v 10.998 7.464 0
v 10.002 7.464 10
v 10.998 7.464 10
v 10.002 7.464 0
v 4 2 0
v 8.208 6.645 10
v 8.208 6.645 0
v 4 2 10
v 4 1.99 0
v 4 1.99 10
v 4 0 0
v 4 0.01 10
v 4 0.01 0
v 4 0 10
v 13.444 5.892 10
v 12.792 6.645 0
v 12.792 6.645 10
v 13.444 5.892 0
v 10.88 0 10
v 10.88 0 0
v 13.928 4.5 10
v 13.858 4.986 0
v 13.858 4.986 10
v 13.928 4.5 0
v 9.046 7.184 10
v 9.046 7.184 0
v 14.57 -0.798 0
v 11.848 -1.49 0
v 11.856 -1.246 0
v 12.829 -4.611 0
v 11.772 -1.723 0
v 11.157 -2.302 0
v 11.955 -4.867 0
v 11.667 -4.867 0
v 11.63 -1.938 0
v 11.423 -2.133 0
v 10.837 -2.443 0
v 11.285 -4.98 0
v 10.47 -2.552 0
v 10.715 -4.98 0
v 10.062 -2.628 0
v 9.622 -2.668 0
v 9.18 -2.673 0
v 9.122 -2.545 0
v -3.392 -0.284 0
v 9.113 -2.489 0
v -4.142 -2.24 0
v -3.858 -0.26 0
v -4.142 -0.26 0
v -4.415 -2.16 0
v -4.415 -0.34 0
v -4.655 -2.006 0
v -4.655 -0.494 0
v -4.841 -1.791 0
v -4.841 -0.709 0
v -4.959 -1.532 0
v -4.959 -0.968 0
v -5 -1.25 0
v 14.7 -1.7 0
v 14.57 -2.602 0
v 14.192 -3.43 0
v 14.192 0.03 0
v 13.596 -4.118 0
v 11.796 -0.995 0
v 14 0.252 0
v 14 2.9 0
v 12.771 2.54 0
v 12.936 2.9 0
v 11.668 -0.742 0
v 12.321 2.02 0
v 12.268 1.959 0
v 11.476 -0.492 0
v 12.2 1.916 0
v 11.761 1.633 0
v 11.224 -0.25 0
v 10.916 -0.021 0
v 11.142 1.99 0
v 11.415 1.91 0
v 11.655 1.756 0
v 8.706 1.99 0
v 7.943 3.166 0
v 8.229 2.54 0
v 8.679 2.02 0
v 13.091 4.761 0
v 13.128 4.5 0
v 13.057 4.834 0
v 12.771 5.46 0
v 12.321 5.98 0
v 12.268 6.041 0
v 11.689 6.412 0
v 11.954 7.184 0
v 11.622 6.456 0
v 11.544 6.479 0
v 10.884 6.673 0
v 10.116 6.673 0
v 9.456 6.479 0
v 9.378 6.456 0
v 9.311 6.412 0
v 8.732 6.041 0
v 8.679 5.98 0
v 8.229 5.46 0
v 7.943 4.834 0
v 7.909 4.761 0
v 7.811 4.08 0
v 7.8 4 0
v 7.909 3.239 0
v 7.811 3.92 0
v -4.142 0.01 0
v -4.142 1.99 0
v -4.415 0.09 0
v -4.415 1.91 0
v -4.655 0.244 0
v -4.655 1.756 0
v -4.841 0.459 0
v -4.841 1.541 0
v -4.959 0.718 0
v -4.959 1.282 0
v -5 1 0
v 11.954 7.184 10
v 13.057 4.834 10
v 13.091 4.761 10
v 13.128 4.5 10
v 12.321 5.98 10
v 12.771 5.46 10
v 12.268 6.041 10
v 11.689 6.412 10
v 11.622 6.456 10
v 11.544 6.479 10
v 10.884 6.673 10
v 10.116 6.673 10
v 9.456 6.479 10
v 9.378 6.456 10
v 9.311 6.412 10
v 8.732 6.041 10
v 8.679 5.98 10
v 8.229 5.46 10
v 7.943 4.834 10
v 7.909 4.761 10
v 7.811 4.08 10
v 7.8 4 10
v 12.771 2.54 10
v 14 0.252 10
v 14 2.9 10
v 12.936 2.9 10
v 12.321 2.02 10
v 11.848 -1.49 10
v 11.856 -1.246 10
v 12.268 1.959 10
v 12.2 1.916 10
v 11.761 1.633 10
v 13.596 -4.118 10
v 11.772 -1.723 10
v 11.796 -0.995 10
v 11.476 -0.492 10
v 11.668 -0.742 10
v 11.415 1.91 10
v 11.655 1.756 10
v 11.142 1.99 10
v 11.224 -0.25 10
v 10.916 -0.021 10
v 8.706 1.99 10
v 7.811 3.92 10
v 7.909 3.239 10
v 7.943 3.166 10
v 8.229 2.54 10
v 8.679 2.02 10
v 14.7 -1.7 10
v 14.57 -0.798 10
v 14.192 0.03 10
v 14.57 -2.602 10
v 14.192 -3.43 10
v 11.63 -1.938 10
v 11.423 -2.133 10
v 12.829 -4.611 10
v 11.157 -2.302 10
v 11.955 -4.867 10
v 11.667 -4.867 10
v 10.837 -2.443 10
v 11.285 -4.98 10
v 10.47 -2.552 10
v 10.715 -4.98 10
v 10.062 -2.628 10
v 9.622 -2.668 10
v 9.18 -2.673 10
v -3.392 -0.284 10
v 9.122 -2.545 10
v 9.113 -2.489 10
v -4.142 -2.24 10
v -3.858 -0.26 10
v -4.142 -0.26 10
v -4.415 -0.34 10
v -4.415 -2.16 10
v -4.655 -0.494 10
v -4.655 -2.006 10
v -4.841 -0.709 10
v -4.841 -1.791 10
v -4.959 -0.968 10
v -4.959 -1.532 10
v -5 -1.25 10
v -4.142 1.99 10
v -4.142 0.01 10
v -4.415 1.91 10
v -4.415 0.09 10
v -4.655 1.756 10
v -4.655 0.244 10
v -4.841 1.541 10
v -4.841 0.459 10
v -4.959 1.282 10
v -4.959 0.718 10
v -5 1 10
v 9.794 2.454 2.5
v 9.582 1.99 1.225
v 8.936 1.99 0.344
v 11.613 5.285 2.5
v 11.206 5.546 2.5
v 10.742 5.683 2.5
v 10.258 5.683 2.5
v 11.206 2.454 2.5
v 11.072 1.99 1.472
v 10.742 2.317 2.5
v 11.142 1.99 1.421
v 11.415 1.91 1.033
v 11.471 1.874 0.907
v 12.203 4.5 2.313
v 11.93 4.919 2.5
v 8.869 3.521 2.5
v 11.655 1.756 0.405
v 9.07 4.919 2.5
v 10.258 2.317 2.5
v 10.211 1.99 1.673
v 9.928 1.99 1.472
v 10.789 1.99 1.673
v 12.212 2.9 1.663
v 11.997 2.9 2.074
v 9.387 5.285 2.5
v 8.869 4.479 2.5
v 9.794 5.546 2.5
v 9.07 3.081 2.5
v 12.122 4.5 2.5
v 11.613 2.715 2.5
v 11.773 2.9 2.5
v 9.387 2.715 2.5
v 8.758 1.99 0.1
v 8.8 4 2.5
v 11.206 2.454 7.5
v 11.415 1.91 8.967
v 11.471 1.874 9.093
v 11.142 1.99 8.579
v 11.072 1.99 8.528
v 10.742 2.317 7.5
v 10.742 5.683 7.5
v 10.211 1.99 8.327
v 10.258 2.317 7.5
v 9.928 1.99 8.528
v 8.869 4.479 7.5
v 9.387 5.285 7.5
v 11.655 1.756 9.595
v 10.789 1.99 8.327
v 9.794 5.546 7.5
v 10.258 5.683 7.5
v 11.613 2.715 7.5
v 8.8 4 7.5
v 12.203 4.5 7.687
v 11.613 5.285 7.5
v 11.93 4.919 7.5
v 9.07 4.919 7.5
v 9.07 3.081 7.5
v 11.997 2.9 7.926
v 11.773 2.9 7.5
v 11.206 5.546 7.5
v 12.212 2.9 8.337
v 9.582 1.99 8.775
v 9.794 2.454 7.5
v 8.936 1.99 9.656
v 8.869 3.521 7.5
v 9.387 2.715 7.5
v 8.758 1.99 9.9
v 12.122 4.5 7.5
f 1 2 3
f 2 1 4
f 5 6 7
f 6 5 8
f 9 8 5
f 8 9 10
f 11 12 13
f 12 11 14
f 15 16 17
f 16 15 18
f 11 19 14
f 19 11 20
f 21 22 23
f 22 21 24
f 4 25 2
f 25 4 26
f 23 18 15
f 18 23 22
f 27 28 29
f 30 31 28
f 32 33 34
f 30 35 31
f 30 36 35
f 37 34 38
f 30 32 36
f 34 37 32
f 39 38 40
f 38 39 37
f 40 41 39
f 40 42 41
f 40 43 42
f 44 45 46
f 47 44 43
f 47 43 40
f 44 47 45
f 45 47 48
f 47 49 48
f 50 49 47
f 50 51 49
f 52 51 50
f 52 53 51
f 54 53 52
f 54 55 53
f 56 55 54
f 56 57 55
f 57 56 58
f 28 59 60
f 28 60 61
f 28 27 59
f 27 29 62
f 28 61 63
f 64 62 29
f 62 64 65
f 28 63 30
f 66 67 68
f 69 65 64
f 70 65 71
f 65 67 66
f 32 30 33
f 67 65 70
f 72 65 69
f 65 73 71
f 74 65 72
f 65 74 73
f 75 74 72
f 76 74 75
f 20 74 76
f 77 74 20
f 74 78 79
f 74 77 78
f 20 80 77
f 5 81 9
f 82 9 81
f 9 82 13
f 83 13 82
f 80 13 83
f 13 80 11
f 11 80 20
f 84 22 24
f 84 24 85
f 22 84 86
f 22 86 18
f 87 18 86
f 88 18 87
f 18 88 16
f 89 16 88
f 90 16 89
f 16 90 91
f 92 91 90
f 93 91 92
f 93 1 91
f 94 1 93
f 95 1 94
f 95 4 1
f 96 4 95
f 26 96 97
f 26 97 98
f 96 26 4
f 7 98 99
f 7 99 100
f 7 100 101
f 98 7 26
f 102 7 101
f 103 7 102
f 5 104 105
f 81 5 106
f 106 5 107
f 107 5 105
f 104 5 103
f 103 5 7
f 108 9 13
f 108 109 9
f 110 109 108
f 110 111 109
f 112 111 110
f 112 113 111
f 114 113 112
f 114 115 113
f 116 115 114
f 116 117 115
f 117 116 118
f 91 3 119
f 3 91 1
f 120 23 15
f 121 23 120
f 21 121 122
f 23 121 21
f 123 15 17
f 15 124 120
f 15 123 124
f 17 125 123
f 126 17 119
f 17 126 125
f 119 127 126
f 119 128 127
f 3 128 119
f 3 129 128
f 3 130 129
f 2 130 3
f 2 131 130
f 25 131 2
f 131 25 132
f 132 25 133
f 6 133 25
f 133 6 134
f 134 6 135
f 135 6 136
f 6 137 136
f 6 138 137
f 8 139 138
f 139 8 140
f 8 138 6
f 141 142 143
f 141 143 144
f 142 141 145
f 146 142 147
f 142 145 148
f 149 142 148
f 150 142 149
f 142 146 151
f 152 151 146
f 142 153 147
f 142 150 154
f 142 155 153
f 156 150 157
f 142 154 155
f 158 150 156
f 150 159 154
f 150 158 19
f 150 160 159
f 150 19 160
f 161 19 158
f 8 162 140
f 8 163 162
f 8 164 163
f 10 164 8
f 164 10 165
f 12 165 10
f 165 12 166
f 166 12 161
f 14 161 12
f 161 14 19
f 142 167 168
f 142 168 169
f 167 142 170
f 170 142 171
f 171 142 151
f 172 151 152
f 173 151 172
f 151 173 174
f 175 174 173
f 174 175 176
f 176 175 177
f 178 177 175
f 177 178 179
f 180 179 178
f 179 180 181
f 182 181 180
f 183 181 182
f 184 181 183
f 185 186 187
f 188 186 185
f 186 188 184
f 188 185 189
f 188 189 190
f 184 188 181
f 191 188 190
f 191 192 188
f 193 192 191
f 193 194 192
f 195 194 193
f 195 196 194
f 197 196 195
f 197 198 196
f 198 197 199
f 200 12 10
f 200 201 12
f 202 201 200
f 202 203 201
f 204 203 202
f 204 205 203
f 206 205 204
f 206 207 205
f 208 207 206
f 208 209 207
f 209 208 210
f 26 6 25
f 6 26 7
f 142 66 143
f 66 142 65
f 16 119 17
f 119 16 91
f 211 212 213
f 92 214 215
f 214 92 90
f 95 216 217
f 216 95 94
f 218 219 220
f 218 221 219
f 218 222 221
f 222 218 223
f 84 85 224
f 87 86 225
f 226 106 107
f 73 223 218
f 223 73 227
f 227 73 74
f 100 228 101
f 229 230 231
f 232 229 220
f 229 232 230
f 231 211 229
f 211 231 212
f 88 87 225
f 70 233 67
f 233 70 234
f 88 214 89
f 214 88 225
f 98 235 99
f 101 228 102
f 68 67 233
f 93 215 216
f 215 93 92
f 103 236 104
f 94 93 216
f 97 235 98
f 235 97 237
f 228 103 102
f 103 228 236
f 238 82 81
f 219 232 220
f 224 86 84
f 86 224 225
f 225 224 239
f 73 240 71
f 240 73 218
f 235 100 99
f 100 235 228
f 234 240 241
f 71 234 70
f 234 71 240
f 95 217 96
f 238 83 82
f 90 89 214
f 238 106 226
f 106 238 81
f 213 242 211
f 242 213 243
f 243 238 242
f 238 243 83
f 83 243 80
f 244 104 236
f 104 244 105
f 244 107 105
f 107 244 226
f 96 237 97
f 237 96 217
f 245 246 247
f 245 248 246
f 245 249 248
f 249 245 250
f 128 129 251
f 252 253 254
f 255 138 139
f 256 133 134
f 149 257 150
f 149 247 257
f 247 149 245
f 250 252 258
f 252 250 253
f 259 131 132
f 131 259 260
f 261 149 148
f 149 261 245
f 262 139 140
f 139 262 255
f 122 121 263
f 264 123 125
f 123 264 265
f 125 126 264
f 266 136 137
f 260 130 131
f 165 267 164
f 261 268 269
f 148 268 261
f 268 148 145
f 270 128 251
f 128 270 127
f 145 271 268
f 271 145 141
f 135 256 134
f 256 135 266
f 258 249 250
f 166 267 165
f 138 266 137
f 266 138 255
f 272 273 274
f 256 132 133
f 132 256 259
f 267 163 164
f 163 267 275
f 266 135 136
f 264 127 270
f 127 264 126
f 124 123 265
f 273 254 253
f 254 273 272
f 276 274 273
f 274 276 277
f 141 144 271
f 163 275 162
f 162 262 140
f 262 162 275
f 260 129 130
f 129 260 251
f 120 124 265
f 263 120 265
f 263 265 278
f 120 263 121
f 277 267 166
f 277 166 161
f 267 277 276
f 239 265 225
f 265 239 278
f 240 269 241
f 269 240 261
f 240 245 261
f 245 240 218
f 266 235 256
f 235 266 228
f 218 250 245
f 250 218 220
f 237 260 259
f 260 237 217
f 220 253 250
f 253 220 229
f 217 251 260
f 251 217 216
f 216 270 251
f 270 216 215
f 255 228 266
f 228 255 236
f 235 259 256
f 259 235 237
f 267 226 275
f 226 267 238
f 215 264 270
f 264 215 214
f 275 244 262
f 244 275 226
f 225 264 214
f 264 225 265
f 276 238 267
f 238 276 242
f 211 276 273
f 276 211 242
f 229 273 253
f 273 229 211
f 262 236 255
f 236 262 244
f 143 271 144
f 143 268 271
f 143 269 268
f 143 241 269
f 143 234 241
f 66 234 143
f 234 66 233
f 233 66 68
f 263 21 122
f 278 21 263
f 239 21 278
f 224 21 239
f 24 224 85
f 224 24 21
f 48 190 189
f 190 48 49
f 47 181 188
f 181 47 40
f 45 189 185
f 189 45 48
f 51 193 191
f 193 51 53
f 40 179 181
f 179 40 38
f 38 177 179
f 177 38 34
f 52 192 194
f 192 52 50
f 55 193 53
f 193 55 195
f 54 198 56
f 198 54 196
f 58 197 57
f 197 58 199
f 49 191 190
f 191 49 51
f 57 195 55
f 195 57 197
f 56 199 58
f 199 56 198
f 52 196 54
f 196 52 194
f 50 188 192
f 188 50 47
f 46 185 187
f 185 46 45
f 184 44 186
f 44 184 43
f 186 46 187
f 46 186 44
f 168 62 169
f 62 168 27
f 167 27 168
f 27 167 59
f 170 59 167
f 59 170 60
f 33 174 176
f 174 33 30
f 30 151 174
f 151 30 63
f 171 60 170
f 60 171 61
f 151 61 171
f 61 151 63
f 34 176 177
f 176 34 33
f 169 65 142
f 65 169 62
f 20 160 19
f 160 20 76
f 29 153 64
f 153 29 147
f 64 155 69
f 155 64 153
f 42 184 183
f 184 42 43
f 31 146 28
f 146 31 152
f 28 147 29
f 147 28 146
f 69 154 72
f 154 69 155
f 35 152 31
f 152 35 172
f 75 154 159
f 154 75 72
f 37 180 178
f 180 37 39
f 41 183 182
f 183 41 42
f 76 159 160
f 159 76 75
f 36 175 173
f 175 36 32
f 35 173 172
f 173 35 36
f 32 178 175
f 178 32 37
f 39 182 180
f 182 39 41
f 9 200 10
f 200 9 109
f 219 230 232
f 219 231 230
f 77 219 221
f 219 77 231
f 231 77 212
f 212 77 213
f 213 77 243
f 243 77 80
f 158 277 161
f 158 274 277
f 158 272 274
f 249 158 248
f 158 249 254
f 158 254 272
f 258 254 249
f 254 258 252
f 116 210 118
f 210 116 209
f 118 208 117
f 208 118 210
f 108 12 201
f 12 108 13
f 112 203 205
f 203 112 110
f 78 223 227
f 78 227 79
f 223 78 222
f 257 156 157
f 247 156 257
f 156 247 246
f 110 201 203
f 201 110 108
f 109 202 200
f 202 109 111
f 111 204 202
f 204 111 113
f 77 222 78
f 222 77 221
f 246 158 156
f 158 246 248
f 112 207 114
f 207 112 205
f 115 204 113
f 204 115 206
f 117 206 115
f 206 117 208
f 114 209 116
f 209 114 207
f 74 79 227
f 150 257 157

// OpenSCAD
// Under1
// Fiber holder for back wheel wells


//-------------------------------------


//--------------------------------------------
module block2(
    r0=3.5,   // radius for boss
    s1=6,   // length of side
    r1=1.0,   // radius for fillets
    z1=10,  // height of block
    r2=1.7,  // radius for fiber cut
    t1=10,   // tongue length
    s2=3,   // slot width
){
    
    translate([7,1.5,0])
    difference(){
        // boss
        hull(){
            translate([r0,2.5,0])
            cylinder(r=r0,h=z1,$fn=22);       
            
            translate([-3,-1.5,0])
            cube([10,2,z1]);       
        }
        
        // fiber hole
        color("blue")
        translate([r0,2.5,-0.5])
        cylinder(r1=r2+1.2, r2=r2,h=z1/4+0.5,$fn=22);
        color("cyan")
        translate([r0,2.5,0.75*z1])
        cylinder(r1=r2, r2=r2+1.2,h=z1/4+0.5,$fn=22);
        color("orange")
        translate([r0,2.5,0])
        cylinder(r=r2,h=z1,$fn=22);
        
        // stress relief
        color("pink")
        translate([0.42*s1,3,-0.5])
        rotate([0,0,-90])
        cube([1.6,10,z1+1]);
        
    }
    
    // tongue led side
    hull(){
        translate([-t1,r1,0])
        color("cyan")
        translate([s1,0,0])
        cylinder(r=r1,h=z1,$fn=22);
        
        translate([5,r1,0])
        color("cyan")
        translate([s1,0,0])
        cylinder(r=r1,h=z1,$fn=22);        
    }

    // tongue wheel side
    translate([0,-s2,0])
    difference(){
    hull(){
        translate([-t1,r1+0.75,0])
        color("cyan")
        translate([s1,0,0])
        cylinder(r=r1,h=z1,$fn=22);
        
        translate([5,r1,0])
        color("cyan")
        translate([s1,-1,0])
        cylinder(r=2*r1,h=z1,$fn=22);        
    }
        translate([-t1+5,3.0,0])
        rotate([0,0,-10])
        cube([18,2,2*z1]);

        color("green")
        translate([12,-1.7+s2,0])
        cylinder(r=3,h=z1,$fn=22);
    }

    // connecting tip
    difference(){
        color("green")
        translate([11.5,-1.7,0])
        cylinder(r=3.2,h=z1,$fn=22);
           
        color("pink")
        translate([8.5,-0.9,-0.5])
        rotate([0,0,-10])
        scale([2,1,1])
        cylinder(r=1.7,h=z1+1,$fn=44);
    }
}






//==============================================

block2();

//=================================================
